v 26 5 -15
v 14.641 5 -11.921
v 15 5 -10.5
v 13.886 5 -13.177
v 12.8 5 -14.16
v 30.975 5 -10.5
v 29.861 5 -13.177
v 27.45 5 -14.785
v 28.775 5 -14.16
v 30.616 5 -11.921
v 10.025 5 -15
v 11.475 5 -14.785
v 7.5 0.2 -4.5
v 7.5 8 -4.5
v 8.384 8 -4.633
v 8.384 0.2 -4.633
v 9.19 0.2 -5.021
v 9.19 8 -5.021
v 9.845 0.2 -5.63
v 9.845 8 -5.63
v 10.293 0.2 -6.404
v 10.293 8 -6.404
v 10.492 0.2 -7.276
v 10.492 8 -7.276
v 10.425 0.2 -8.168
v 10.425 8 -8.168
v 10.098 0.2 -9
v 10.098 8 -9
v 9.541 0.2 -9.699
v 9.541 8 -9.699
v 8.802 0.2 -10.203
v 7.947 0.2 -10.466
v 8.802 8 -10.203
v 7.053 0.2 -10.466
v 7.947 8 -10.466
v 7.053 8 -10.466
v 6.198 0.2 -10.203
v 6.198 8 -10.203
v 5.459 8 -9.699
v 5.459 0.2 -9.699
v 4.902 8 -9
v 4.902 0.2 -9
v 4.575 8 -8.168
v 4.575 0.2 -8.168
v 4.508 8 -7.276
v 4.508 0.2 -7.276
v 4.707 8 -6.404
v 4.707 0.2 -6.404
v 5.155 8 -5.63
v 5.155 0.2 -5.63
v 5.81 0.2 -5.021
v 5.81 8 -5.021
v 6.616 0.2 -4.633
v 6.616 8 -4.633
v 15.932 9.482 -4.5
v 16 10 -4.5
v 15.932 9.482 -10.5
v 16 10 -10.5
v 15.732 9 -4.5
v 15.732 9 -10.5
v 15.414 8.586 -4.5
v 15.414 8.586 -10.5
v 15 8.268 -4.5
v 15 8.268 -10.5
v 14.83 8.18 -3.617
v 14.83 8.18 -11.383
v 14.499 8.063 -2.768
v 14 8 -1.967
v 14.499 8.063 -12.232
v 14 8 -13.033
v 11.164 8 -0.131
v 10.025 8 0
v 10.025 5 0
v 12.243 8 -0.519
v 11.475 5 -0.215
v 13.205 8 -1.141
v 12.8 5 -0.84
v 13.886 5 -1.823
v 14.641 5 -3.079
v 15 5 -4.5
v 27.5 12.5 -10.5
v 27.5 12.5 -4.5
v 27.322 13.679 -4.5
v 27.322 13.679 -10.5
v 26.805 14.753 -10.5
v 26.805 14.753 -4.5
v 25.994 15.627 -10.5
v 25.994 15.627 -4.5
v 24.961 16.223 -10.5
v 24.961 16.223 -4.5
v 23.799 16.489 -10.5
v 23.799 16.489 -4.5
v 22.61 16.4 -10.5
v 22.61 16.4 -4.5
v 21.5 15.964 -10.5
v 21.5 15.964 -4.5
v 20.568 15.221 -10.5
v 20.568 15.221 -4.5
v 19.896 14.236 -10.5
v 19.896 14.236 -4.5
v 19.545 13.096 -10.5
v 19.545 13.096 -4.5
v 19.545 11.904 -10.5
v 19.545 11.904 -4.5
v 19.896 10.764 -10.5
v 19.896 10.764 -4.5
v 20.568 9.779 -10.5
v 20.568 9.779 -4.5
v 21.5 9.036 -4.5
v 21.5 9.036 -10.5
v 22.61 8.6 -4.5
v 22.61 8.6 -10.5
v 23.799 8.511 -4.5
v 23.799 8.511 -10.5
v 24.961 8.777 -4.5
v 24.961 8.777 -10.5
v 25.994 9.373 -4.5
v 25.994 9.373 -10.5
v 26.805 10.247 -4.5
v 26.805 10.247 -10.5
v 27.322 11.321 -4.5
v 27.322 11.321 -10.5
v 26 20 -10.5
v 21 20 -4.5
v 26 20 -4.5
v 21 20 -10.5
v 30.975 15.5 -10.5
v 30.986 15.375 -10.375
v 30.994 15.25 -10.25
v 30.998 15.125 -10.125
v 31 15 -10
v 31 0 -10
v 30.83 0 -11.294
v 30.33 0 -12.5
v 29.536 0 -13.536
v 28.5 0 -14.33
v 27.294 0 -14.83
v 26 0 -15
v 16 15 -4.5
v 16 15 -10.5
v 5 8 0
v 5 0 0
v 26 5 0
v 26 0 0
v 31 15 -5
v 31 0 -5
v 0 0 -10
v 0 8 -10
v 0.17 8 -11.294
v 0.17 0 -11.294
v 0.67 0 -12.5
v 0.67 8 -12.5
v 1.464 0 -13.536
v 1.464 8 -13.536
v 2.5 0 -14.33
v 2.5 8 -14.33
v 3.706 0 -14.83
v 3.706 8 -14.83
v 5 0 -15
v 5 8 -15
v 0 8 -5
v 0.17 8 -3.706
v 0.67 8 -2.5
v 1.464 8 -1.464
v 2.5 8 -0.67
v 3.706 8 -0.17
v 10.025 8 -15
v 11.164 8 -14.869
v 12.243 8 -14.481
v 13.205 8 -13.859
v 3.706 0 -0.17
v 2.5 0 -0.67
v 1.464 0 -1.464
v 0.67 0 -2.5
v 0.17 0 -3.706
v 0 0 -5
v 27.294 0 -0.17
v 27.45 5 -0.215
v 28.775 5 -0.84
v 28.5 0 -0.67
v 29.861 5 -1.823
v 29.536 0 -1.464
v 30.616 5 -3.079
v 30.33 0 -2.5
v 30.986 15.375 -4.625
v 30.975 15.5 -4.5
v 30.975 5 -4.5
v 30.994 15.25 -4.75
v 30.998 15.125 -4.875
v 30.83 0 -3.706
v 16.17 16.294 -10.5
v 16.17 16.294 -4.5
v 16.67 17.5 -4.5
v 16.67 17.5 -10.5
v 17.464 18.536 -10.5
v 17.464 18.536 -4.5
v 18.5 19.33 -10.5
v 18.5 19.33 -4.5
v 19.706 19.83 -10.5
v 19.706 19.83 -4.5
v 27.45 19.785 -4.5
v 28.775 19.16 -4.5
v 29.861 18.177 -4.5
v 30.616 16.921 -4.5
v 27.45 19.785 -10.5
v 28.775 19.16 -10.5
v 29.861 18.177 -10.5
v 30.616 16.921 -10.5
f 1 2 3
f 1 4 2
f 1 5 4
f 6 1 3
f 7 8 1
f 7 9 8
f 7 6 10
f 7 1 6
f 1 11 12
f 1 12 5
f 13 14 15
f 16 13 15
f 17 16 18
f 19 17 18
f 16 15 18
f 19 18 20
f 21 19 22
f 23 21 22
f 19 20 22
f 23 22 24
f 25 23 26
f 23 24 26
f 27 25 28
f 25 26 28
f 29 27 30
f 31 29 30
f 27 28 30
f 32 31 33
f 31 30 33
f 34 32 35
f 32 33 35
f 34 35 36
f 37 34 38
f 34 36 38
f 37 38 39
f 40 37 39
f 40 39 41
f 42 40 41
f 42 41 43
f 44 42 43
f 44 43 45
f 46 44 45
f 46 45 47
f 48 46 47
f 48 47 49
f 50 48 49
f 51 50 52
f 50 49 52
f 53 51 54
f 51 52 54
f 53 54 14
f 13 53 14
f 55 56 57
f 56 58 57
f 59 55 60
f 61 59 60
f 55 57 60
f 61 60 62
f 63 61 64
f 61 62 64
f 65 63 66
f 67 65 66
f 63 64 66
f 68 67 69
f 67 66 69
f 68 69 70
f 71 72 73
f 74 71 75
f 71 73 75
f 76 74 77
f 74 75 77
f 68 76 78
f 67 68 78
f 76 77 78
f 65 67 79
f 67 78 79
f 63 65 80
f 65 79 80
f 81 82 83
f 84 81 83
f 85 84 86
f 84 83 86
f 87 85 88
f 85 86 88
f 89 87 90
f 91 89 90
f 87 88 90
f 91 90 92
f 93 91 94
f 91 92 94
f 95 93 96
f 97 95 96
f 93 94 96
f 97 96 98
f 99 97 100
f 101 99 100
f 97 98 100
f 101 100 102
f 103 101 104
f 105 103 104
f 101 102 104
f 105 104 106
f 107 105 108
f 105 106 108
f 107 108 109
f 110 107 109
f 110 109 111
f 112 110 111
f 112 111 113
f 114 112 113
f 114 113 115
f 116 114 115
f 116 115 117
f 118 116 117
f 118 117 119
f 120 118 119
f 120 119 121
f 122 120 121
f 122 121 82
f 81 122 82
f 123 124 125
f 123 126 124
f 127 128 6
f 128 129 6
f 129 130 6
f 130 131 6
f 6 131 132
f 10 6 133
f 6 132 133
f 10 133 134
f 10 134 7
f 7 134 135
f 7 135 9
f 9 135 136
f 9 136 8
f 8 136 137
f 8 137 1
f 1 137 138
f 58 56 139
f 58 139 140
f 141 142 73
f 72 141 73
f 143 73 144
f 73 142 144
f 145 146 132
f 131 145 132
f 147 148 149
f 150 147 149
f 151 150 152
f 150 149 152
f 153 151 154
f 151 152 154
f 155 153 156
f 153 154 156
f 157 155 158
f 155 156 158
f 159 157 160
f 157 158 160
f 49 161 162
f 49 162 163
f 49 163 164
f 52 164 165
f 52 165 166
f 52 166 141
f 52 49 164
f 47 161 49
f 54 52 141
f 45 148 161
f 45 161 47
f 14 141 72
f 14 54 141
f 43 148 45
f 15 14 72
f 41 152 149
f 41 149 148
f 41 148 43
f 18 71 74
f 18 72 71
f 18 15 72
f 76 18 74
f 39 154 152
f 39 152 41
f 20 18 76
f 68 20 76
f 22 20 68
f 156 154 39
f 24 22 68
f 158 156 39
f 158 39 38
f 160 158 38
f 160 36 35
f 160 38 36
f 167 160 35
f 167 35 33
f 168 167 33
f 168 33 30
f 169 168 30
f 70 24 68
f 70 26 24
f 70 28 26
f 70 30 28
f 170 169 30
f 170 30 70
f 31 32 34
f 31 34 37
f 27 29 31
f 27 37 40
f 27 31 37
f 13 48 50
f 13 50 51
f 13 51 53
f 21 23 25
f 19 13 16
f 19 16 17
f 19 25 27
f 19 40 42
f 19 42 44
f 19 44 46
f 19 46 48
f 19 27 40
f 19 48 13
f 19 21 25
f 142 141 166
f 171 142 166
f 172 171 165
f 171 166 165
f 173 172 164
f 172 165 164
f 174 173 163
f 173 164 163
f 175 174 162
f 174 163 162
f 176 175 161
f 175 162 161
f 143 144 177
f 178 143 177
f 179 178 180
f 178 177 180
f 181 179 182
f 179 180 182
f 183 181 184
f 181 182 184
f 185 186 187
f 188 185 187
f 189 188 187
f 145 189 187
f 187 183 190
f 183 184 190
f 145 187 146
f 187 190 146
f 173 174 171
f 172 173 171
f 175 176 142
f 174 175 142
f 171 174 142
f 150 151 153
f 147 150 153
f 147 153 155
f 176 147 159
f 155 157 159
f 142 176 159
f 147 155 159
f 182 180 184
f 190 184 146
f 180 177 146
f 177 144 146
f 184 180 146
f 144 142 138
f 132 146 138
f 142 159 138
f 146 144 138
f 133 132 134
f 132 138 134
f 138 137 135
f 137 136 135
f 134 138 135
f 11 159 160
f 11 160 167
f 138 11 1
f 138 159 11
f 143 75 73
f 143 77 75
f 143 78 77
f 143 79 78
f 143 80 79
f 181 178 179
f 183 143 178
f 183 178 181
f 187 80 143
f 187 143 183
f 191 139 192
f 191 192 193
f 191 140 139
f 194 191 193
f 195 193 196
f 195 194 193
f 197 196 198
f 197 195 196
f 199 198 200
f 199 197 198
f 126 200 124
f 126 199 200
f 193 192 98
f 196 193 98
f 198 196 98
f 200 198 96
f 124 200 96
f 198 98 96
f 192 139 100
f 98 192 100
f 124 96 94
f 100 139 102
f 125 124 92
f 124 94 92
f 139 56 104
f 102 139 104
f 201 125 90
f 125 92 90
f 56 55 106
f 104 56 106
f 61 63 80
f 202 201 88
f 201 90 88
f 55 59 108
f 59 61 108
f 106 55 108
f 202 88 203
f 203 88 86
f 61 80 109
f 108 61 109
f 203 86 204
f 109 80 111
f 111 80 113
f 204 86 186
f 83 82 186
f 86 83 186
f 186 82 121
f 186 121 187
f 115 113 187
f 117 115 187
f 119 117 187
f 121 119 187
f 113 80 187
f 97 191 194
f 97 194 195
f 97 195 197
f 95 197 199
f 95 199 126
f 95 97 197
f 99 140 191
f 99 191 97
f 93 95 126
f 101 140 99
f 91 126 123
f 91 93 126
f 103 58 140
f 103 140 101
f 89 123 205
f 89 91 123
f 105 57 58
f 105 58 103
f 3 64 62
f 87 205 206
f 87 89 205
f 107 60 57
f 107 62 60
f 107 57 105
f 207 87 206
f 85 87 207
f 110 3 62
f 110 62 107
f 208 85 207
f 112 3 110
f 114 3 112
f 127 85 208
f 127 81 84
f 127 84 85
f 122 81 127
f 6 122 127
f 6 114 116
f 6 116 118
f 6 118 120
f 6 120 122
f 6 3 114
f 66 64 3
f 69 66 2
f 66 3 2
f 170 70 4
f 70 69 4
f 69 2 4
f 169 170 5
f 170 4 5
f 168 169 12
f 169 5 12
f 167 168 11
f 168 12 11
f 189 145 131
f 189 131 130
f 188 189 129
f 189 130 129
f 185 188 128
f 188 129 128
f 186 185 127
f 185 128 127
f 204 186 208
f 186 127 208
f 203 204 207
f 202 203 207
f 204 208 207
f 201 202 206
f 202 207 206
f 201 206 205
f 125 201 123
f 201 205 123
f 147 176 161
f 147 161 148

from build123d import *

# Parameters (mm, degrees)
SKETCH1_W           = 31
SKETCH1_H           = 15
BOSS_EXTRUDE1_DEPTH = 5
SKETCH2_W           = 15
SKETCH2_H           = 15
BOSS_EXTRUDE2_DEPTH = 3
SKETCH3_W           = 15
SKETCH3_H           = 6
BOSS_EXTRUDE3_DEPTH = 15
SKETCH4_W           = 1
SKETCH4_H           = 6
RIB_DEPTH           = 3
SKETCH5_R           = 4
CUT_EXTRUDE1_DEPTH  = 39.356876828
SKETCH6_R           = 3
CUT_EXTRUDE2_DEPTH  = 7.8
FILLET1_R           = 5
FILLET2_R           = 5
FILLET3_R           = 2


with BuildPart() as part:
    # Sketch1 → Boss-Extrude1 (new body)
    with BuildSketch(Plane(origin=(0, 0, 0), x_dir=(1, 0, 0), z_dir=(0, 1, 0))):
        with Locations((15.5, 7.5)):
            Rectangle(SKETCH1_W, SKETCH1_H)
    extrude(amount=BOSS_EXTRUDE1_DEPTH)

    # Sketch2 → Boss-Extrude2 (add)
    with BuildSketch(Plane(origin=(0, 5, 0), x_dir=(1, 0, 0), z_dir=(0, 1, 0))):
        with Locations((7.5, 7.5)):
            Rectangle(SKETCH2_W, SKETCH2_H)
    extrude(amount=BOSS_EXTRUDE2_DEPTH)

    # Sketch3 → Boss-Extrude3 (add)
    with BuildSketch(Plane(origin=(0, 5, 0), x_dir=(1, 0, 0), z_dir=(0, 1, 0))):
        with Locations((23.5, 7.5)):
            Rectangle(SKETCH3_W, SKETCH3_H)
    extrude(amount=BOSS_EXTRUDE3_DEPTH)

    # Sketch4 → rib (add)
    with BuildSketch(Plane(origin=(0, 5, 0), x_dir=(1, 0, 0), z_dir=(0, 1, 0))):
        with Locations((15.5, 7.5)):
            Rectangle(SKETCH4_W, SKETCH4_H)
    extrude(amount=RIB_DEPTH)

    # Sketch5 → Cut-Extrude1 (cut, through all)
    with BuildSketch(Plane.XY.offset(-4.5)):
        with Locations((23.5, 12.5)):
            Circle(SKETCH5_R)
    extrude(amount=-CUT_EXTRUDE1_DEPTH, mode=Mode.SUBTRACT)

    # Sketch6 → Cut-Extrude2 (cut)
    with BuildSketch(Plane(origin=(0, 8, 0), x_dir=(1, 0, 0), z_dir=(0, 1, 0))):
        with Locations(Location((7.5, 7.5, 0), (0, 0, 270))):
            Circle(SKETCH6_R)
    extrude(amount=-CUT_EXTRUDE2_DEPTH, mode=Mode.SUBTRACT)

    # Fillet1
    fillet1_edges = [part.edges().sort_by_distance(p)[0] for p in [
        (16, 20, -7.5),
        (31, 20, -7.5),
    ]]
    fillet(fillet1_edges, radius=FILLET1_R)

    # Fillet2
    # the kernel refuses this fillet: 5 mm, written as the material it takes off along each edge
    with BuildSketch(Plane(origin=(31, -12.5, -15), x_dir=(0, 0, 1), z_dir=(0, 1, 0))) as fillet2_piece_1:
        with BuildLine():
            CenterArc((FILLET2_R, -FILLET2_R), FILLET2_R, 90, 90)
            Line((0, -FILLET2_R), (0, 0))
            Line((0, 0), (FILLET2_R, 0))
        make_face()
    extrude(amount=30, mode=Mode.SUBTRACT)
    with BuildSketch(Plane(origin=(31, -12.5, 0), x_dir=(0, 0, -1), z_dir=(0, 1, 0))) as fillet2_piece_2:
        with BuildLine():
            CenterArc((FILLET2_R, FILLET2_R), FILLET2_R, 180, 90)
            Line((0, FILLET2_R), (0, 0))
            Line((0, 0), (FILLET2_R, 0))
        make_face()
    extrude(amount=30, mode=Mode.SUBTRACT)
    with BuildSketch(Plane(origin=(15, 5, -15), x_dir=(-1, 0, 0), z_dir=(0, 1, 0))) as fillet2_piece_3:
        with BuildLine():
            CenterArc((4.974937186, 5), FILLET2_R, 185.739170477, 84.260829523)
            Line((0, 4.5), (0, 0))
            Line((0, 0), (4.974937186, 0))
        make_face()
    extrude(amount=15.437342964, mode=Mode.SUBTRACT)
    with BuildSketch(Plane(origin=(15, 5, 0), x_dir=(-1, 0, 0), z_dir=(0, 1, 0))) as fillet2_piece_4:
        with BuildLine():
            CenterArc((4.974937186, -5), FILLET2_R, 90, 84.260829523)
            Line((0, -4.5), (0, 0))
            Line((0, 0), (4.974937186, 0))
        make_face()
    extrude(amount=15.437342964, mode=Mode.SUBTRACT)
    with BuildSketch(Plane(origin=(0, 20.5, 0), x_dir=(1, 0, 0), z_dir=(0, -1, 0))) as fillet2_piece_5:
        with BuildLine():
            CenterArc((FILLET2_R, -FILLET2_R), FILLET2_R, 90, 90)
            Line((0, -FILLET2_R), (0, 0))
            Line((0, 0), (FILLET2_R, 0))
        make_face()
    extrude(amount=33, mode=Mode.SUBTRACT)
    with BuildSketch(Plane(origin=(0, 20.5, -15), x_dir=(1, 0, 0), z_dir=(0, -1, 0))) as fillet2_piece_6:
        with BuildLine():
            CenterArc((FILLET2_R, FILLET2_R), FILLET2_R, 180, 90)
            Line((0, FILLET2_R), (0, 0))
            Line((0, 0), (FILLET2_R, 0))
        make_face()
    extrude(amount=33, mode=Mode.SUBTRACT)

    # Fillet3
    fillet3_edges = [part.edges().sort_by_distance(p)[0] for p in [
        (16, 8, -7.5),
    ]]
    fillet(fillet3_edges, radius=FILLET3_R)


solid = part.part
